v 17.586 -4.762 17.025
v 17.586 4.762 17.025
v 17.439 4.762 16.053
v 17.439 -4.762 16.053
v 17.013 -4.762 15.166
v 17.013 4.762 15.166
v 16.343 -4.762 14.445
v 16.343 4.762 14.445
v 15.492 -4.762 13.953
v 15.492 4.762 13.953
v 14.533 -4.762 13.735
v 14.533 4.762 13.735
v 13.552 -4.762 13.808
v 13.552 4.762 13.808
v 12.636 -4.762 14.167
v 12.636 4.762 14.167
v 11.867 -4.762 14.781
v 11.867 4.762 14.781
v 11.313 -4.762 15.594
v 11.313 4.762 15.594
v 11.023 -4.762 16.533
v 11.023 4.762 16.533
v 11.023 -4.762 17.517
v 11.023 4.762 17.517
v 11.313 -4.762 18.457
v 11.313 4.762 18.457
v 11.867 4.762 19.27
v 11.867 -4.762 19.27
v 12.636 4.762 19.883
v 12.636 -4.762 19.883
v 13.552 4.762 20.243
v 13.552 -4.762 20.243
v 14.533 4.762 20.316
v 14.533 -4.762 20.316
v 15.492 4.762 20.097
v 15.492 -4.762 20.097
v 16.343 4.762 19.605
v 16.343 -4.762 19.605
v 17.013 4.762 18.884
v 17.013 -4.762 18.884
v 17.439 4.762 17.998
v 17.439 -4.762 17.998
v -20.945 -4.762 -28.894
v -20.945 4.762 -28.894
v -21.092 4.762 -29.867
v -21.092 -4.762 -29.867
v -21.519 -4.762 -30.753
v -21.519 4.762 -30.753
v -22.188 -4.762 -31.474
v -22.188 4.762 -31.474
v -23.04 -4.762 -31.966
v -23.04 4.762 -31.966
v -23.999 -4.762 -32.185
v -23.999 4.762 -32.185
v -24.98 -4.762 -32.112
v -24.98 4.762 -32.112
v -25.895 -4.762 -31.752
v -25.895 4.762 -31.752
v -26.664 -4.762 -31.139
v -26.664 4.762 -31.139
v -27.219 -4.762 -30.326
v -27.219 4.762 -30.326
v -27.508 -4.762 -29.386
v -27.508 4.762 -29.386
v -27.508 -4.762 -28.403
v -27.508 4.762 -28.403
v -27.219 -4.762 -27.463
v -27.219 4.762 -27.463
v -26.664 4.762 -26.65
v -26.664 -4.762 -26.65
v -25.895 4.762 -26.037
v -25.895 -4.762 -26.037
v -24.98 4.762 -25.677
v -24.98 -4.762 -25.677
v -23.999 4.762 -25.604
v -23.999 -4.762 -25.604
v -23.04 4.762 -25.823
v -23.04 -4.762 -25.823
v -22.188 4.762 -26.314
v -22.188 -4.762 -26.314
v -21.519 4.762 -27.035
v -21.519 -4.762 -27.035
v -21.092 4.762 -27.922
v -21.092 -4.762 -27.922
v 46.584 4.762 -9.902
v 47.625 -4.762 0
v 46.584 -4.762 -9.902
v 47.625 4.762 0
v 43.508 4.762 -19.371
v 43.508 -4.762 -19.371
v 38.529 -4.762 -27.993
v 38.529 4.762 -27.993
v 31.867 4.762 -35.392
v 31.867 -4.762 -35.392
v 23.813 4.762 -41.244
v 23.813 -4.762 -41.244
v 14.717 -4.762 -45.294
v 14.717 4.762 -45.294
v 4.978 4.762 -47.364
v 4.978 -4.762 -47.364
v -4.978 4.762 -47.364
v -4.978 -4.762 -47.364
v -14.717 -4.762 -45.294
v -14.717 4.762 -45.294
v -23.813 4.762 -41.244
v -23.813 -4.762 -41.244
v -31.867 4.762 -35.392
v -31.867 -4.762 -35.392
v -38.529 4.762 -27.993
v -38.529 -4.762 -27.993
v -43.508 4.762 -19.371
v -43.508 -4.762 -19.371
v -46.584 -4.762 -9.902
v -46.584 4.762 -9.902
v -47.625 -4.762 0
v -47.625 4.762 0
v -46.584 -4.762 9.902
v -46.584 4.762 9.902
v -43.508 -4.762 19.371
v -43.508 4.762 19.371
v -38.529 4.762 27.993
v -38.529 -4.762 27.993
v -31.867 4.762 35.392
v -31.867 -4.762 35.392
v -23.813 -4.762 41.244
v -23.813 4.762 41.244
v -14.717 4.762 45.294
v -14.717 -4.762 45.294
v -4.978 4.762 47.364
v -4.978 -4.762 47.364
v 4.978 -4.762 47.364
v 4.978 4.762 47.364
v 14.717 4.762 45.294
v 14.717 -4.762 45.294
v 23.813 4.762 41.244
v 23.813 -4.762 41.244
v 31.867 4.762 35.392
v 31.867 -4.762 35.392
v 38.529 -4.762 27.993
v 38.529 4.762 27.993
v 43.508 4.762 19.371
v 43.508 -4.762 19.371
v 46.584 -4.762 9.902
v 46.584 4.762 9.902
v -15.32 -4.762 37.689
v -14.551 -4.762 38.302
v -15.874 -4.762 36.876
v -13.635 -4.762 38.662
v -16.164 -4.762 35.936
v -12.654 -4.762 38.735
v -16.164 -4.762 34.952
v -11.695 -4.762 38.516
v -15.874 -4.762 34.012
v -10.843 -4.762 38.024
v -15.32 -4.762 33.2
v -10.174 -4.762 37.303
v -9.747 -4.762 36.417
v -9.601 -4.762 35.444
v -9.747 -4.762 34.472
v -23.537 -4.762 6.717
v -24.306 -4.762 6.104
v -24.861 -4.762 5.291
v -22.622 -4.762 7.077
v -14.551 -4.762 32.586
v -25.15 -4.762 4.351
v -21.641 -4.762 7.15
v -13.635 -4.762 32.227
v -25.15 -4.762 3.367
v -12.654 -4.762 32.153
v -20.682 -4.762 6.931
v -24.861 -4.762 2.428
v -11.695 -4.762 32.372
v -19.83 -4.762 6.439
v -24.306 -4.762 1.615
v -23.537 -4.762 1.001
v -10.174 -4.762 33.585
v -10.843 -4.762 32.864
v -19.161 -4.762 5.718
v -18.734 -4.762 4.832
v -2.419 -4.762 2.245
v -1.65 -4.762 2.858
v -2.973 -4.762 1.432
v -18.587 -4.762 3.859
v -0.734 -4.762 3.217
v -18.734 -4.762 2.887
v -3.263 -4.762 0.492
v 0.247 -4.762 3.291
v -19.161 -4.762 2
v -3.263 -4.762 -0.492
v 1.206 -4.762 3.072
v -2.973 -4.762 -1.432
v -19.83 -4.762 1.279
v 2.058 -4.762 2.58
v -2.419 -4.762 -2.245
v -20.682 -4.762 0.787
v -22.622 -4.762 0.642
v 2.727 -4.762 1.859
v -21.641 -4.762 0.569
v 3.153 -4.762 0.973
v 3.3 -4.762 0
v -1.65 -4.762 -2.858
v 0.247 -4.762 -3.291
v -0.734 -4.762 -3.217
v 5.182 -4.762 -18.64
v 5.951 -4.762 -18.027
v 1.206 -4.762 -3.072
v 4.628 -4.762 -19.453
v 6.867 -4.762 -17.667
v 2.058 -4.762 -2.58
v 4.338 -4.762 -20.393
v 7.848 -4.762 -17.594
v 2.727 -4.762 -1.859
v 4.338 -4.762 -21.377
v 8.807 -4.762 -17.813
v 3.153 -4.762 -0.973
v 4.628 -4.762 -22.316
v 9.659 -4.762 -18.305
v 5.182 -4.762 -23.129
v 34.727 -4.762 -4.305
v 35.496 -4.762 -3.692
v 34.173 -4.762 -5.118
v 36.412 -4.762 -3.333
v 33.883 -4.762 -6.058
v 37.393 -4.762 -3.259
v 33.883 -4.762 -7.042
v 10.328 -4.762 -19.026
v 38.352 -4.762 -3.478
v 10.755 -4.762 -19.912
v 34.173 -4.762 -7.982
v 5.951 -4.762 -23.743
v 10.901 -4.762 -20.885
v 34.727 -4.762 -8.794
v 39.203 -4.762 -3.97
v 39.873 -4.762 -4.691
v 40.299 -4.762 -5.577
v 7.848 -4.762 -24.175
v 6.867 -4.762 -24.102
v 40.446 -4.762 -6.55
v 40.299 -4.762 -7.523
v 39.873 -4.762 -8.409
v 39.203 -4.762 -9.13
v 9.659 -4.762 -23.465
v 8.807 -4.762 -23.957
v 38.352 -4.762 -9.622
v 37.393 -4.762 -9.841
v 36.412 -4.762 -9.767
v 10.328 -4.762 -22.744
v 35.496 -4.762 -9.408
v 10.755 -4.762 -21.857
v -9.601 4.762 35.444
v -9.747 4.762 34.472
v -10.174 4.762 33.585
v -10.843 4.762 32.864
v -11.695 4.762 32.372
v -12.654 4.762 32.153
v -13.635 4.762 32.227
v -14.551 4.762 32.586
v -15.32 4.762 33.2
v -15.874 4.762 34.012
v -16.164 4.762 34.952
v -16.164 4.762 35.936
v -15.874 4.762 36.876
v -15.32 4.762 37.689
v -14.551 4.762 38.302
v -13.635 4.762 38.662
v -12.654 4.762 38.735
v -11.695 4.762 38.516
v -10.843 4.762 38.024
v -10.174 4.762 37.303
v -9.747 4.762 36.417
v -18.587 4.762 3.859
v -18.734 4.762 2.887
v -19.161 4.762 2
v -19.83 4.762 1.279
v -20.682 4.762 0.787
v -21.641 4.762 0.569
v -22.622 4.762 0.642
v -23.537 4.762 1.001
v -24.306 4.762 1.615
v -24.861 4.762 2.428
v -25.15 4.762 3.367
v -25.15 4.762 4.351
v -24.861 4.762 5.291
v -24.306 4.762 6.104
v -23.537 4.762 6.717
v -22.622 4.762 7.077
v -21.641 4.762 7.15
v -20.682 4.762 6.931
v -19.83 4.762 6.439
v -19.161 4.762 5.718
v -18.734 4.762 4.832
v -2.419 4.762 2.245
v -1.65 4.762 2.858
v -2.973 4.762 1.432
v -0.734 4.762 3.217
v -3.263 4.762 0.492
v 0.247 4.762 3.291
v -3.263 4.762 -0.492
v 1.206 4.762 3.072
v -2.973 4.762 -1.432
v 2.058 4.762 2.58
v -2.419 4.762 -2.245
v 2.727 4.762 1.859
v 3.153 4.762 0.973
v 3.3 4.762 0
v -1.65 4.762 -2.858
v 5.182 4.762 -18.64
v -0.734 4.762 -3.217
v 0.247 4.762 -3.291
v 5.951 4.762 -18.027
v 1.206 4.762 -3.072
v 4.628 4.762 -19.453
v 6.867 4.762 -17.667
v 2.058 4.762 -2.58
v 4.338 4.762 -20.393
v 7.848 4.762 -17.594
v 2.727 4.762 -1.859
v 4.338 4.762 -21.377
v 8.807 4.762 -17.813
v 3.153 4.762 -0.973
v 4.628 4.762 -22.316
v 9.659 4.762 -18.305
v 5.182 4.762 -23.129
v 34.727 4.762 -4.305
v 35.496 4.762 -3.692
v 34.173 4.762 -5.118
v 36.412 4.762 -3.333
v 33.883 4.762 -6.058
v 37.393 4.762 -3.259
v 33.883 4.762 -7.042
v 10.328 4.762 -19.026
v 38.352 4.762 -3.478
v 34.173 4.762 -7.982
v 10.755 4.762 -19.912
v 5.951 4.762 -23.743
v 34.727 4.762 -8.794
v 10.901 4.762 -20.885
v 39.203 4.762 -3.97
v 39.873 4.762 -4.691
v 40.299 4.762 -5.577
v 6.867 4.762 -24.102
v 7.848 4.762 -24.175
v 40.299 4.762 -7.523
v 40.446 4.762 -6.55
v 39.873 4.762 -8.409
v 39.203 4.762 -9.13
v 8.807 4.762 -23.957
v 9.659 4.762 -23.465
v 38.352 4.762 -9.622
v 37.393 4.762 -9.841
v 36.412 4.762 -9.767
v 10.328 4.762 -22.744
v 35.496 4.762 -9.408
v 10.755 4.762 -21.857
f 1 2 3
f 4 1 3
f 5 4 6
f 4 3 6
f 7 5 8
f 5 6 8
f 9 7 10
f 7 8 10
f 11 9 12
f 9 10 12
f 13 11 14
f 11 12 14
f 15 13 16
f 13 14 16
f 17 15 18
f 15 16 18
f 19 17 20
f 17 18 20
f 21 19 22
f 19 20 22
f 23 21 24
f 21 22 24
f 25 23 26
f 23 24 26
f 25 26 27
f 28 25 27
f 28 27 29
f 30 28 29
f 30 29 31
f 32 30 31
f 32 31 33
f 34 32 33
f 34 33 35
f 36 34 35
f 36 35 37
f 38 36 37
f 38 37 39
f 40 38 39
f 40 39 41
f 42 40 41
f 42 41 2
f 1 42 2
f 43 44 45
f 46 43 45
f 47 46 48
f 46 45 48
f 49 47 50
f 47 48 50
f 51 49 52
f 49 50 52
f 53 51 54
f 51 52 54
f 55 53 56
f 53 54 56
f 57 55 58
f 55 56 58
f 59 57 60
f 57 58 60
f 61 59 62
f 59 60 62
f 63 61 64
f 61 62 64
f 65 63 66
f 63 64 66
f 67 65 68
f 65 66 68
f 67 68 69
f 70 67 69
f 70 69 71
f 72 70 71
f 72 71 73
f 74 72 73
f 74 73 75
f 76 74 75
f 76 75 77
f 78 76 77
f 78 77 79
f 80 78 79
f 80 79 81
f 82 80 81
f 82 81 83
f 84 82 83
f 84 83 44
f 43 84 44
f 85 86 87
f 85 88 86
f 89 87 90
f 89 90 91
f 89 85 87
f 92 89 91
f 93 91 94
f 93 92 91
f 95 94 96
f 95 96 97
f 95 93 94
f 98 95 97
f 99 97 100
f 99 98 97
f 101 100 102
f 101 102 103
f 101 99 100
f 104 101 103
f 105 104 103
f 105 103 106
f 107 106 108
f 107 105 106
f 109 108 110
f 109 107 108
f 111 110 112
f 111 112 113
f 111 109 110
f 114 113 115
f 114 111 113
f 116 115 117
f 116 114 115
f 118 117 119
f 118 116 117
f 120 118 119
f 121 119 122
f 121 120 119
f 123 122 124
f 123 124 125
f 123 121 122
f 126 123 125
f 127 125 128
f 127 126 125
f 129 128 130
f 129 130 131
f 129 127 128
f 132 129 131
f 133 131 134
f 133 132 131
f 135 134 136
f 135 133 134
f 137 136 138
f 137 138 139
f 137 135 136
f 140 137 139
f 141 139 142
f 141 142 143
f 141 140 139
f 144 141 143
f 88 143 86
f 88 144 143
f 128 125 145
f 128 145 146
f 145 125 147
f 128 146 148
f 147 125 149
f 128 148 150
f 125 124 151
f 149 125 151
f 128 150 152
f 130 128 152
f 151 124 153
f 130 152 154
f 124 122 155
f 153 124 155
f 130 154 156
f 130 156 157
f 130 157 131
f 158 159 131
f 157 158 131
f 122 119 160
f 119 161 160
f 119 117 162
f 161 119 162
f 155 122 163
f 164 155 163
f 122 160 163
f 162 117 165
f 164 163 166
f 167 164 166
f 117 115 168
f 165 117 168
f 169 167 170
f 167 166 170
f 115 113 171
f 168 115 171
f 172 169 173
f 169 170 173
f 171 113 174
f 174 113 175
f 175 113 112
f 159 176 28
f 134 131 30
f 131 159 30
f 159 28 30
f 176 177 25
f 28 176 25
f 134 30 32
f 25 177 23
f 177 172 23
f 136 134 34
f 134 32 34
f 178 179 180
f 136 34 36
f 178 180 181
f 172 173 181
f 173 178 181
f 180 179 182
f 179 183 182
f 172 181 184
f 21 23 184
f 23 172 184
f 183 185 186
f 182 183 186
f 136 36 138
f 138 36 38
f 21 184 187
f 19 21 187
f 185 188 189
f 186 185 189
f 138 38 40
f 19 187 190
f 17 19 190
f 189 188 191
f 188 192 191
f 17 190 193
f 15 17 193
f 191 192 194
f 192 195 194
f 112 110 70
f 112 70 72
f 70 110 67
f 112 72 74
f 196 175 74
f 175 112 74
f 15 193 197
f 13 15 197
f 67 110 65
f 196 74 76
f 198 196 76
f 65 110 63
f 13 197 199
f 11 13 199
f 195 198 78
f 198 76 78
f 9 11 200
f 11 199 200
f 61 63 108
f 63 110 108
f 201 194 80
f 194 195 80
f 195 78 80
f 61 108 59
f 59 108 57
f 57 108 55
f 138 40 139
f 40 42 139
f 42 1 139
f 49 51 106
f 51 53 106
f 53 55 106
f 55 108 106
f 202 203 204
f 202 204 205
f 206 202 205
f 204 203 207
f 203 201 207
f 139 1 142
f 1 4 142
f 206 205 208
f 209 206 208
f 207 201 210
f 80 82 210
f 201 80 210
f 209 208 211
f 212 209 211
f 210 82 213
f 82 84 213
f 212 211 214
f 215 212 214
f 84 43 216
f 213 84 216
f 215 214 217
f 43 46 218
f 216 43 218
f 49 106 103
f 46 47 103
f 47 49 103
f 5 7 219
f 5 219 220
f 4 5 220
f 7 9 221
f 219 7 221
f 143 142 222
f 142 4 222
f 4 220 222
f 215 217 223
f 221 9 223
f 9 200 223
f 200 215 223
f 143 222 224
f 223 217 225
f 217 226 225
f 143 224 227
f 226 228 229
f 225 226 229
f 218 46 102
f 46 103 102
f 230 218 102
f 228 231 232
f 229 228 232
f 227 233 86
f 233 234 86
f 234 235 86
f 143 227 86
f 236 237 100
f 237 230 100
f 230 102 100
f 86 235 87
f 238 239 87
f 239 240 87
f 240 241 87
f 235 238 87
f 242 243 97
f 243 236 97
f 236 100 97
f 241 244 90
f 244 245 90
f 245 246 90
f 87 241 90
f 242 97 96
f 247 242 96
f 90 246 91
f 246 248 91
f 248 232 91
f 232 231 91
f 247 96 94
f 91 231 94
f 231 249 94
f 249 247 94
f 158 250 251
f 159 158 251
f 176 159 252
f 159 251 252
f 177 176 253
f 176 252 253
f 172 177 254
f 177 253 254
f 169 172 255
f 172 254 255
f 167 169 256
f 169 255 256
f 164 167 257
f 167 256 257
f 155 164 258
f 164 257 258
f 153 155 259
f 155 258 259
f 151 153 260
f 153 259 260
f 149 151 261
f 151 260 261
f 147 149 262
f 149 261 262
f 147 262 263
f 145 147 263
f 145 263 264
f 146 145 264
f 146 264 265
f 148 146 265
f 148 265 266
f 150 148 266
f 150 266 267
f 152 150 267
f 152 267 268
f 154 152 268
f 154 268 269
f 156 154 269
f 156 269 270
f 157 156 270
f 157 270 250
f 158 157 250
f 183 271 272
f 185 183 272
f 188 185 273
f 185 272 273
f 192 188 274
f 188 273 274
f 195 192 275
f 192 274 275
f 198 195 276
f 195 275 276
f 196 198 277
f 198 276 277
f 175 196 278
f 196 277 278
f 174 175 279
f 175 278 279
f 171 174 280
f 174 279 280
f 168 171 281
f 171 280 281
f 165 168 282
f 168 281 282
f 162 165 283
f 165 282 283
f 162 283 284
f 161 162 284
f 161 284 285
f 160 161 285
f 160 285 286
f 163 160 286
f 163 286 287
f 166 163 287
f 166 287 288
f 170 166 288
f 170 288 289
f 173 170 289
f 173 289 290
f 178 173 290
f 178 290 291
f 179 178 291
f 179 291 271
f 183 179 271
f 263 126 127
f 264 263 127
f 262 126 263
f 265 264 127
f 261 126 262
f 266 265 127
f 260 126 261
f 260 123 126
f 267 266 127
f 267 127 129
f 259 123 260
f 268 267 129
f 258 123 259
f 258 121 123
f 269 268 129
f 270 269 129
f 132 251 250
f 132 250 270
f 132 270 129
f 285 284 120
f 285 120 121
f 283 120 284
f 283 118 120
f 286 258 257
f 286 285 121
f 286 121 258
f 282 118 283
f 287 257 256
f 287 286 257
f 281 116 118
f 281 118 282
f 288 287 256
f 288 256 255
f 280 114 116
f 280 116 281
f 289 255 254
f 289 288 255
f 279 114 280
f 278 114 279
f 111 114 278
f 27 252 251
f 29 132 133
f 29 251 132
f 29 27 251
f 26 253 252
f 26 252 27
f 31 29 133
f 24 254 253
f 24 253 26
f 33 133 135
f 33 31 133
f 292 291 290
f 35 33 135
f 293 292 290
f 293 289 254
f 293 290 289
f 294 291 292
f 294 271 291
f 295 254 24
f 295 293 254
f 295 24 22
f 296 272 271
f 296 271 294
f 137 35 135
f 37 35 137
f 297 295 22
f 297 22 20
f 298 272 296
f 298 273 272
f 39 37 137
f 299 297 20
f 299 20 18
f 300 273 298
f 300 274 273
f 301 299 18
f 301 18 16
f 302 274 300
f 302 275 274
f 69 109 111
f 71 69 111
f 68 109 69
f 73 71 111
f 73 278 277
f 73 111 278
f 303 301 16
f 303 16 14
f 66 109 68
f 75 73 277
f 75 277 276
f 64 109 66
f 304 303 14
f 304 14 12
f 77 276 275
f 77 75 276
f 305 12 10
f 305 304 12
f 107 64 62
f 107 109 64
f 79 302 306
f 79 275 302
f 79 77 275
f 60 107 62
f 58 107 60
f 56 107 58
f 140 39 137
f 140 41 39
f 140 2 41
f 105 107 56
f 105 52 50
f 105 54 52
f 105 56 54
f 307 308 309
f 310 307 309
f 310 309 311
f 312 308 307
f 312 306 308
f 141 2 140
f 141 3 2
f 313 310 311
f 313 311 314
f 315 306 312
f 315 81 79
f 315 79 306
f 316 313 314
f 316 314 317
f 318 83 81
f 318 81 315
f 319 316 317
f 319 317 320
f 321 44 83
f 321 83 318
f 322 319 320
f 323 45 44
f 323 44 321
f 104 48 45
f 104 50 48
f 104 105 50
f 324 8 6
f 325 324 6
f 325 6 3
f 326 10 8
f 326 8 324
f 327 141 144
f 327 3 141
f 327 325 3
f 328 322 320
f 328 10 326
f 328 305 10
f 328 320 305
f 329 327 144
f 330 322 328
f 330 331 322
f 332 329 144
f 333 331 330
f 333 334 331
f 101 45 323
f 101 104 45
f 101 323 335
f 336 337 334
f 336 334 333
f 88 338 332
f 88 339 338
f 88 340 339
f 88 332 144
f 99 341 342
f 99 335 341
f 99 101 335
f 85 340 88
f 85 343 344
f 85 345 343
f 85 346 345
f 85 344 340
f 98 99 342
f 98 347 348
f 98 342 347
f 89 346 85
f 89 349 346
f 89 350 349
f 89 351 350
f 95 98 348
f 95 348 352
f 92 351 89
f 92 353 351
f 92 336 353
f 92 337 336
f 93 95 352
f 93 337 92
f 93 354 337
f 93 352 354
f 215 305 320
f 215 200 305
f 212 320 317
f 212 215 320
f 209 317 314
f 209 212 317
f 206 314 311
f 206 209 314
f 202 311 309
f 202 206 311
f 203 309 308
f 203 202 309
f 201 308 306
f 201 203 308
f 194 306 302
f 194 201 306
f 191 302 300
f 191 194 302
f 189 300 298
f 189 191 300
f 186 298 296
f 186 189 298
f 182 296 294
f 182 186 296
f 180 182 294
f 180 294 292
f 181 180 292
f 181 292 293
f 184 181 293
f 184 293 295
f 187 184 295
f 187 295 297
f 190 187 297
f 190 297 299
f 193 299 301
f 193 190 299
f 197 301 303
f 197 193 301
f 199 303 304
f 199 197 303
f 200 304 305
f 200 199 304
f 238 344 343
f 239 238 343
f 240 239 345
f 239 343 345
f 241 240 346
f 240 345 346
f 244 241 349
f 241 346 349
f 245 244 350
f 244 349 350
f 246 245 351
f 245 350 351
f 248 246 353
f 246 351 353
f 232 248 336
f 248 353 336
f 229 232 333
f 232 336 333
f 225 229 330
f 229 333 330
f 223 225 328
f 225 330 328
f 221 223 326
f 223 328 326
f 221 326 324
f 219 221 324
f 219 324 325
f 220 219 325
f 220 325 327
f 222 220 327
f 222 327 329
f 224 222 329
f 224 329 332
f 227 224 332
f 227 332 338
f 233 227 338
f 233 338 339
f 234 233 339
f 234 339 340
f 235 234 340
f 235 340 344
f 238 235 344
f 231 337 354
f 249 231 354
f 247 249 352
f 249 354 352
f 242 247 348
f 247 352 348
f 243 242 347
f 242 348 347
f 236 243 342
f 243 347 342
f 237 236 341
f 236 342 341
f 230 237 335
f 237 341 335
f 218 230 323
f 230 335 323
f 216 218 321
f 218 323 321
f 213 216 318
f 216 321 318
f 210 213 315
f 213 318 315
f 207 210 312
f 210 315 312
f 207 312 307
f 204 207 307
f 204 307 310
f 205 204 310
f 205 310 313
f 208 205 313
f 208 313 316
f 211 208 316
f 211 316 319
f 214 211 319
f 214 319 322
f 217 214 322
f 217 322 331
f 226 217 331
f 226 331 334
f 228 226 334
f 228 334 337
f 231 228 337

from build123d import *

# Parameters (mm, degrees)
SKETCH1_R           = 47.625
SKETCH1_R_2         = 3.3
BOSS_EXTRUDE1_DEPTH = 4.7625
SKETCH4_R           = 3.3
CUT_EXTRUDE2_DEPTH  = 10.525


with BuildPart() as part:
    # Sketch1 → Boss-Extrude1 (new body, symmetric)
    with BuildSketch(Plane(origin=(0, 0, 0), x_dir=(1, 0, 0), z_dir=(0, 1, 0))):
        Circle(SKETCH1_R)
        Circle(SKETCH1_R_2, mode=Mode.SUBTRACT)
    extrude(amount=BOSS_EXTRUDE1_DEPTH, both=True)

    # Sketch4 → Cut-Extrude2 (cut, through all)
    with BuildSketch(Plane(origin=(0, 4.7625, 0), x_dir=(1, 0, 0), z_dir=(0, 1, 0))):
        with Locations((-12.900657786, -35.444265963)):
            Circle(SKETCH4_R)
        with Locations((-24.24530585, 28.89443035)):
            Circle(SKETCH4_R)
        with Locations((37.145963636, 6.549835613)):
            Circle(SKETCH4_R)
        with Locations((14.285954625, -17.025337748)):
            Circle(SKETCH4_R)
        with Locations((-21.887352311, -3.859330749)):
            Circle(SKETCH4_R)
        with Locations((7.601397685, 20.884668497)):
            Circle(SKETCH4_R)
    extrude(amount=-CUT_EXTRUDE2_DEPTH, mode=Mode.SUBTRACT)


solid = part.part
